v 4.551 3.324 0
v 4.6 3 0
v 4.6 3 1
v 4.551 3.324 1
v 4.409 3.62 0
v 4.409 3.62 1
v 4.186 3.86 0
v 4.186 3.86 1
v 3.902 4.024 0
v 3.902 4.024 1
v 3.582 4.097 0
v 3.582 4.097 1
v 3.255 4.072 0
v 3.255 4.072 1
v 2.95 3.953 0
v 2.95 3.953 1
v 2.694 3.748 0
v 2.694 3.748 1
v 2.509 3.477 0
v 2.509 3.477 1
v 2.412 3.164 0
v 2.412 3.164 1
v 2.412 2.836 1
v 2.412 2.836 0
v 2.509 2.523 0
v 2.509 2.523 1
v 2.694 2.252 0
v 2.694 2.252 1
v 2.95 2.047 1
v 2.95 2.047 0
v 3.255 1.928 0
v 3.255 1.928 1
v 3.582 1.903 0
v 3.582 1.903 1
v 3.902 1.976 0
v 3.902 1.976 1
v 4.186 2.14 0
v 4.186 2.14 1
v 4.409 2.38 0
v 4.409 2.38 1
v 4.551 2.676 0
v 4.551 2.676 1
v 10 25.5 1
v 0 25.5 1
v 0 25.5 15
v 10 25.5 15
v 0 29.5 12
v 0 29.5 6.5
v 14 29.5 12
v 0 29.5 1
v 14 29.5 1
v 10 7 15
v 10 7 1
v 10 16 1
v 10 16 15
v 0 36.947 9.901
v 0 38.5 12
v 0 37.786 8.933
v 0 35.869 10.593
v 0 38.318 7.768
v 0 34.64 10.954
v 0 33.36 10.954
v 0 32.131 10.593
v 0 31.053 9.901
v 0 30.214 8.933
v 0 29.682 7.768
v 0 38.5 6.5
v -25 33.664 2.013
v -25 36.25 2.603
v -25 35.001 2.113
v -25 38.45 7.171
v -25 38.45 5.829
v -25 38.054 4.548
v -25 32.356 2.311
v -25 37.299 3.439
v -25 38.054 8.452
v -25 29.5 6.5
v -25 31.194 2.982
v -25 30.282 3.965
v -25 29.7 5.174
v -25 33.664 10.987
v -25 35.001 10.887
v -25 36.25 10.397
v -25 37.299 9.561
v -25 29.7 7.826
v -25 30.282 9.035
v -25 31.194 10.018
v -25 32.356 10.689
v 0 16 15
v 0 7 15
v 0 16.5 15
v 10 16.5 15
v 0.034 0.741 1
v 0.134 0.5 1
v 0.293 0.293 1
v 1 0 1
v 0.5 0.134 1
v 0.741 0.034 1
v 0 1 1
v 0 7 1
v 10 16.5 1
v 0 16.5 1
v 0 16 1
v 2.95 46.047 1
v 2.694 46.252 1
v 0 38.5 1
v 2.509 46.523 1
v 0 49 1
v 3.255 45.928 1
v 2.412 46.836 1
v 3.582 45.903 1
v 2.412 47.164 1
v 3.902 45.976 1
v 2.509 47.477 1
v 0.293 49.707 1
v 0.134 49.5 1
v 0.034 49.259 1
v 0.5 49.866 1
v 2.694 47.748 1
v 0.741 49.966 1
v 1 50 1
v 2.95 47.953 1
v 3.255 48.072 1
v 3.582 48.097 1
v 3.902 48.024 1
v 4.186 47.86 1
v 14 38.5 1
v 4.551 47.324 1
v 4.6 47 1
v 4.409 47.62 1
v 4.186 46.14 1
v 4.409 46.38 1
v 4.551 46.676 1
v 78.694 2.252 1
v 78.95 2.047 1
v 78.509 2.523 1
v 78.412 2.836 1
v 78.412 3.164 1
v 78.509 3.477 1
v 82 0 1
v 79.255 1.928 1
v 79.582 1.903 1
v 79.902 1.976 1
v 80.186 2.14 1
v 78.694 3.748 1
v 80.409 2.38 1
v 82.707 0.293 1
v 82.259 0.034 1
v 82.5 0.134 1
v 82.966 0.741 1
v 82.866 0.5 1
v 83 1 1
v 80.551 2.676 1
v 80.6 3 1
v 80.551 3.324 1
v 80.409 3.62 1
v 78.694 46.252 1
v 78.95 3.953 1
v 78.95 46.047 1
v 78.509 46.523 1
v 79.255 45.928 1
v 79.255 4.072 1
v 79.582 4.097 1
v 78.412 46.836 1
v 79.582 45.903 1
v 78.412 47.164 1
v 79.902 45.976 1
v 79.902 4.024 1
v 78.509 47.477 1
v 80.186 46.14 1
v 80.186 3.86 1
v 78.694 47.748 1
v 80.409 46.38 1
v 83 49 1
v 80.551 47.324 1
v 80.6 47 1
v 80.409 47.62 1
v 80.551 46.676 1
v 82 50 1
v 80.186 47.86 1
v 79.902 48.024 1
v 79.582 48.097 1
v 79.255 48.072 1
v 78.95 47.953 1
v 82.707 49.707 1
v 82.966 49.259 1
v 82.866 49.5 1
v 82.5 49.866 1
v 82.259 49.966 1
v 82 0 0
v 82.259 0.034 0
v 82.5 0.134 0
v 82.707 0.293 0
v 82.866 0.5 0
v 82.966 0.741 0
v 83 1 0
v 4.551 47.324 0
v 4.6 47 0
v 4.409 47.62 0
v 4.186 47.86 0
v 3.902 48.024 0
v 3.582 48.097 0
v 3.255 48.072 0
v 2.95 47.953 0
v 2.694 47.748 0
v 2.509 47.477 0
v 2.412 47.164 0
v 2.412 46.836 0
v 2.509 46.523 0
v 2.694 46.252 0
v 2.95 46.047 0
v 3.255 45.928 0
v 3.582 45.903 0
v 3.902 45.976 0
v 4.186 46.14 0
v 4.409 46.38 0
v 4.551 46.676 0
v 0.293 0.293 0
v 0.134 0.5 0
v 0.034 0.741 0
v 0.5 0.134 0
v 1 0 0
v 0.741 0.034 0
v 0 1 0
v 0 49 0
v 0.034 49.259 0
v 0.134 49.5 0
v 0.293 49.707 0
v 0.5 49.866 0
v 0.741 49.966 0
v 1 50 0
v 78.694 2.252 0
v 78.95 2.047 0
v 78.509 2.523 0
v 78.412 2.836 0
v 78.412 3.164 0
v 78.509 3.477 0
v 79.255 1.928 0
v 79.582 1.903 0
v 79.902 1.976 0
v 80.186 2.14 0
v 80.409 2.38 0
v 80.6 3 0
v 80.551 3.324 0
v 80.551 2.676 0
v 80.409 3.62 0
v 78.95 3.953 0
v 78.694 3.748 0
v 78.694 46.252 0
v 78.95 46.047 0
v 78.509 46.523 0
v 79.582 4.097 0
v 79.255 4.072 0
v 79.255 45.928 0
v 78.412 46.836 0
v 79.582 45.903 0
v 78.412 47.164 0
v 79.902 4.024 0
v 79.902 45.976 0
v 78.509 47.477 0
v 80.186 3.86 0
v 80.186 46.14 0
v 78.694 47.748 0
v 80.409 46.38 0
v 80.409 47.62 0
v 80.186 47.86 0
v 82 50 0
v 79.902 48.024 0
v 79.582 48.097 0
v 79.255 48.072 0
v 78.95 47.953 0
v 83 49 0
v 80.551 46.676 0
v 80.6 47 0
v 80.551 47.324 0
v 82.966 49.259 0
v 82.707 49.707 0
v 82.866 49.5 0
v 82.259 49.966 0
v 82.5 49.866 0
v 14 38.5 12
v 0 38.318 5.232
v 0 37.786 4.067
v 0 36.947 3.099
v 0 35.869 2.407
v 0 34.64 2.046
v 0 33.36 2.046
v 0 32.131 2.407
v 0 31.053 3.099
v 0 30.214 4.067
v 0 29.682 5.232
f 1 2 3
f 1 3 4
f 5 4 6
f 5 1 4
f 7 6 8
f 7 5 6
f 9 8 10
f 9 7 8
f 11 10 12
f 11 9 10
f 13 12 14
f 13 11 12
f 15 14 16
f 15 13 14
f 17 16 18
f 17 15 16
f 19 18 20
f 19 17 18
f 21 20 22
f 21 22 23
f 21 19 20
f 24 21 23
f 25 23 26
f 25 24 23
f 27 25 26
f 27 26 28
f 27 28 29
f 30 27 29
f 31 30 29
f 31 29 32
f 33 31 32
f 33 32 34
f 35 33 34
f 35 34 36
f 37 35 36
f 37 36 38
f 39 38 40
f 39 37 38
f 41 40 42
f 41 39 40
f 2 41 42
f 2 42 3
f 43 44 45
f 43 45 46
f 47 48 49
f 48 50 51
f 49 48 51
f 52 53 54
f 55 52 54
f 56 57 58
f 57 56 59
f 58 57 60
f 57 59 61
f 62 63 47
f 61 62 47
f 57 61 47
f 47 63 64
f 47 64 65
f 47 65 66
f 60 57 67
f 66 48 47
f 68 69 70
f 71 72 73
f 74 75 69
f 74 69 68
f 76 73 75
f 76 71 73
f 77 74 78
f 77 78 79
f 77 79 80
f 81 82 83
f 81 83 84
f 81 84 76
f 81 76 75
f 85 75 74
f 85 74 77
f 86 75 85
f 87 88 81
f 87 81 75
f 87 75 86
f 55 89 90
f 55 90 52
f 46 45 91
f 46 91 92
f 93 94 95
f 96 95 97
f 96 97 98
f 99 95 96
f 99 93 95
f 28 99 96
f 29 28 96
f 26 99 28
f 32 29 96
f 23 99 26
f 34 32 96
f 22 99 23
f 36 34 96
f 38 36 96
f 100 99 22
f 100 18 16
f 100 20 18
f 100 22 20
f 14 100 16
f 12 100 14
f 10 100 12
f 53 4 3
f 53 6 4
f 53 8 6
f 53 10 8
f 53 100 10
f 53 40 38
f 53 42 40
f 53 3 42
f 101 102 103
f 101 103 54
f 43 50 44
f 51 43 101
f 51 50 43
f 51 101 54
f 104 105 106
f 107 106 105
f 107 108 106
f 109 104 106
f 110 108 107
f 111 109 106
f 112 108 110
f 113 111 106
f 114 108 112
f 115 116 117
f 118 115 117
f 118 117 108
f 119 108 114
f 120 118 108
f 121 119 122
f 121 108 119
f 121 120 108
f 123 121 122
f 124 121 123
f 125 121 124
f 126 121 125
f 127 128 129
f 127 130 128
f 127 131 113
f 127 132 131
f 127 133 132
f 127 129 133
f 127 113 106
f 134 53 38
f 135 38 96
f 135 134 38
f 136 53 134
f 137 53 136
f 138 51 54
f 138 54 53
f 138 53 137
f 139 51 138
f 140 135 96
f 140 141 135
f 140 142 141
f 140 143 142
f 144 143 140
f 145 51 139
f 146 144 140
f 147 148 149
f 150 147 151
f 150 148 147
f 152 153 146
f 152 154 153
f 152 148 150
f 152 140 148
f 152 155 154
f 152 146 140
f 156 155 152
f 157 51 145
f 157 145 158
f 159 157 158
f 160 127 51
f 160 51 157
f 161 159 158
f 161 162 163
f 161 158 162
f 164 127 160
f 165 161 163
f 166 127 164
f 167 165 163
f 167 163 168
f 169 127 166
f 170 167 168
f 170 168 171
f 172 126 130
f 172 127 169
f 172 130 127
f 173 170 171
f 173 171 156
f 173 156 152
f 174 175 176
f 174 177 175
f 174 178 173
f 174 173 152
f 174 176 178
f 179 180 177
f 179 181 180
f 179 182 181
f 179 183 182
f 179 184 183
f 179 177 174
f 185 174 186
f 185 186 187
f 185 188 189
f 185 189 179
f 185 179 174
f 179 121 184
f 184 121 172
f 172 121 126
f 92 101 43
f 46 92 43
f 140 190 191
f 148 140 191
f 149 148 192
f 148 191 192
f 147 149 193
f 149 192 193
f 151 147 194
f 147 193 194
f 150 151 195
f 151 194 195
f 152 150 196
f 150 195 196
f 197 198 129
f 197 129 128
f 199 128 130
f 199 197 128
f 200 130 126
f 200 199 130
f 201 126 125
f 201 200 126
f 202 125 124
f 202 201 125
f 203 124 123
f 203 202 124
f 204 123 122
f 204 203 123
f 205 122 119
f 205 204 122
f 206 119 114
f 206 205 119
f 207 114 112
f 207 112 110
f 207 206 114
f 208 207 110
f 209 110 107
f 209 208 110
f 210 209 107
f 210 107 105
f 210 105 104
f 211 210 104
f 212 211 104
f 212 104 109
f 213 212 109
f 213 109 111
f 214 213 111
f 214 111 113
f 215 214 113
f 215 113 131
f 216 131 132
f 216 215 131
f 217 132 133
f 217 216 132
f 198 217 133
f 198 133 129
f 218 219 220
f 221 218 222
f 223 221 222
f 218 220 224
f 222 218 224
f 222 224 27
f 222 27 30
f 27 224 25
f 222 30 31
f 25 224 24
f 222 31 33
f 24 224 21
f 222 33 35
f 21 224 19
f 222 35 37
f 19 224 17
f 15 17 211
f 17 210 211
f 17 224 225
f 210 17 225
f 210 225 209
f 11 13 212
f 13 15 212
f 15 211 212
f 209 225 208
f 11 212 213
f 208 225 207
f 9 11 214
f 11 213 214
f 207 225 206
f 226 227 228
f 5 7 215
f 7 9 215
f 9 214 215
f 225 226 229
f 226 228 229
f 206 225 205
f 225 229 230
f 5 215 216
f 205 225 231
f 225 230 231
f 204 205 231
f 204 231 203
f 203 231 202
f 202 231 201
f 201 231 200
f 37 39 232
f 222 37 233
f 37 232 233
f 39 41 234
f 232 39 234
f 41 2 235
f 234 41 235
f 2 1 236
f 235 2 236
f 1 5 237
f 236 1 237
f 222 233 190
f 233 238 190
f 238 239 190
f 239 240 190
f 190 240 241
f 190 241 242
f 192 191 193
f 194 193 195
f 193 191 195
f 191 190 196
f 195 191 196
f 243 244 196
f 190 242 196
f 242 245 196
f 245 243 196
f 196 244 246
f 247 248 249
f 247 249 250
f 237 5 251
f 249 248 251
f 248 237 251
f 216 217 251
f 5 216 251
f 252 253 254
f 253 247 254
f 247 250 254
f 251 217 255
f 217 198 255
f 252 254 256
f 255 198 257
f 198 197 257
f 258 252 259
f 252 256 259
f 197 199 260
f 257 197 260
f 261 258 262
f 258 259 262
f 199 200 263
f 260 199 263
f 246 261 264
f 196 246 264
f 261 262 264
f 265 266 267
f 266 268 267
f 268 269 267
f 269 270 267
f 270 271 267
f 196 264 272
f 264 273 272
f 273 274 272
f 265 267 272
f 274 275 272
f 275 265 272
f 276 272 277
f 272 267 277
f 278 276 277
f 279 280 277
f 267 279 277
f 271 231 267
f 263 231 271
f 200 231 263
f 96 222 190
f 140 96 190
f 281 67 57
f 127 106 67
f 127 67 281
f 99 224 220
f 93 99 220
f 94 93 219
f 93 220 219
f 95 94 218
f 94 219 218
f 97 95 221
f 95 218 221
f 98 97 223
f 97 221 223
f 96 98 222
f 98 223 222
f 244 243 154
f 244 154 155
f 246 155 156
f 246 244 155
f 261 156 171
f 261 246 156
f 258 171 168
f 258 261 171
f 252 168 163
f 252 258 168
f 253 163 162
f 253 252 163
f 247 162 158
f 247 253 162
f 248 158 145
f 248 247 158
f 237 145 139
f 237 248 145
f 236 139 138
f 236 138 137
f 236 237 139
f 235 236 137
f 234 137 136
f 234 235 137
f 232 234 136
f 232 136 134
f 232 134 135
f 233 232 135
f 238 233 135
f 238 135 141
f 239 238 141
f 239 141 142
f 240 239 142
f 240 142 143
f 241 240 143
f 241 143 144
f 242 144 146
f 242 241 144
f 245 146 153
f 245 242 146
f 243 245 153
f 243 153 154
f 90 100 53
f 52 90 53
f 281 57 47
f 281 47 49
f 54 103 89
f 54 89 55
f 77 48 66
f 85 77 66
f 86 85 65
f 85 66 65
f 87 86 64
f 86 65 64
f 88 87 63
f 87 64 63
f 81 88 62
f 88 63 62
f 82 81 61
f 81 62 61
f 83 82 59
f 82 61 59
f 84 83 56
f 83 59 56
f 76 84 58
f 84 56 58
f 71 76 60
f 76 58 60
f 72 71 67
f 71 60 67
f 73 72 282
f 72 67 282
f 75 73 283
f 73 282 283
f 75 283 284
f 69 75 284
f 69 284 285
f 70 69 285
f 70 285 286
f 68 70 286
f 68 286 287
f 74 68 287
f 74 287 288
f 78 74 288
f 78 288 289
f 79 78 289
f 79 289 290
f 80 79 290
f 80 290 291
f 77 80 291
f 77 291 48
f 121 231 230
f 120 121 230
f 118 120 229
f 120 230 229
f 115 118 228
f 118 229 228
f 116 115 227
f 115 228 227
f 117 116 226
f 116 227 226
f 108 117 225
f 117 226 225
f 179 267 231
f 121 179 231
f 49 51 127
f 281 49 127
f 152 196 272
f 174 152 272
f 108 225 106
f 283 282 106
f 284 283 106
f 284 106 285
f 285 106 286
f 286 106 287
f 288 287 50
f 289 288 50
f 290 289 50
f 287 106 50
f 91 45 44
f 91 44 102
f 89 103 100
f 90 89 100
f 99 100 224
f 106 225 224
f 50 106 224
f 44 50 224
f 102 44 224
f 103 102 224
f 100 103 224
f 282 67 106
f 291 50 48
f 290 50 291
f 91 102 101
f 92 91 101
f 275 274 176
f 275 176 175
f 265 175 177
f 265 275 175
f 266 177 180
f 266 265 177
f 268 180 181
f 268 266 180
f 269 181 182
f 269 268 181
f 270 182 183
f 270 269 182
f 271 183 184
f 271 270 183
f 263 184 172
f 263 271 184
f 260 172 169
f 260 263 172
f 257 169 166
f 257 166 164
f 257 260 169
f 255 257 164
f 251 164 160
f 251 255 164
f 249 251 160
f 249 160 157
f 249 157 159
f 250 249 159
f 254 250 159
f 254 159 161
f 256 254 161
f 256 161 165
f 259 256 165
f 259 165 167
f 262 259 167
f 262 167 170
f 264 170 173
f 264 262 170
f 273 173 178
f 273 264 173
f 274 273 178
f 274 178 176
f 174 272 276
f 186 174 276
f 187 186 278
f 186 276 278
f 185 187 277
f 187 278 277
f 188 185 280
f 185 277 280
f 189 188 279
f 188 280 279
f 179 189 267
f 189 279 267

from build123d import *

# Parameters (mm, degrees)
F0_R     = 1.1
F1_DEPTH = 1
F2_W     = 10
F2_H     = 9
F3_DEPTH = 14
F2_W_2   = 14
F4_DEPTH = 11
F6_DEPTH = 25


with BuildPart() as f1:
    # F0 (on Top) → F1 (new body)
    with BuildSketch(Plane.XY):
        with BuildLine():
            ThreePointArc((0, 1), (0.2928932188, 0.2928932188), (1, 0))
            Line((1, 0), (82, 0))
            ThreePointArc((82, 0), (82.7071067812, 0.2928932188), (83, 1))
            Line((83, 1), (83, 49))
            ThreePointArc((83, 49), (82.7071067812, 49.7071067812), (82, 50))
            Line((82, 50), (1, 50))
            ThreePointArc((1, 50), (0.2928932188, 49.7071067812), (0, 49))
            Line((0, 49), (0, 1))
        make_face()
        with Locations((3.5, 3)):
            Circle(F0_R, mode=Mode.SUBTRACT)
        with Locations((79.5, 3)):
            Circle(F0_R, mode=Mode.SUBTRACT)
        with Locations((3.5, 47)):
            Circle(F0_R, mode=Mode.SUBTRACT)
        with Locations((79.5, 47)):
            Circle(F0_R, mode=Mode.SUBTRACT)
    extrude(amount=F1_DEPTH)

    # F2 (on face) → F3 (join)
    with BuildSketch(Plane.XY.offset(1)):
        with Locations((5, 11.5)):
            Rectangle(F2_W, F2_H)
        with Locations((5, 21)):
            Rectangle(F2_W, F2_H)
    extrude(amount=F3_DEPTH)

    # F2 (on face) → F4 (join)
    with BuildSketch(Plane.XY.offset(1)):
        with Locations((7, 34)):
            Rectangle(F2_W_2, F2_H)
    extrude(amount=F4_DEPTH)

    # F5 (on face) → F6 (join)
    with BuildSketch(Plane(origin=(0, 0, 0), x_dir=(0, -1, 0), z_dir=(-1, 0, 0))):
        with BuildLine():
            ThreePointArc((-38.5, 6.5), (-34, 2), (-29.5, 6.5))
            ThreePointArc((-29.5, 6.5), (-34, 11), (-38.5, 6.5))
        make_face()
    extrude(amount=F6_DEPTH)


solid = f1.part
